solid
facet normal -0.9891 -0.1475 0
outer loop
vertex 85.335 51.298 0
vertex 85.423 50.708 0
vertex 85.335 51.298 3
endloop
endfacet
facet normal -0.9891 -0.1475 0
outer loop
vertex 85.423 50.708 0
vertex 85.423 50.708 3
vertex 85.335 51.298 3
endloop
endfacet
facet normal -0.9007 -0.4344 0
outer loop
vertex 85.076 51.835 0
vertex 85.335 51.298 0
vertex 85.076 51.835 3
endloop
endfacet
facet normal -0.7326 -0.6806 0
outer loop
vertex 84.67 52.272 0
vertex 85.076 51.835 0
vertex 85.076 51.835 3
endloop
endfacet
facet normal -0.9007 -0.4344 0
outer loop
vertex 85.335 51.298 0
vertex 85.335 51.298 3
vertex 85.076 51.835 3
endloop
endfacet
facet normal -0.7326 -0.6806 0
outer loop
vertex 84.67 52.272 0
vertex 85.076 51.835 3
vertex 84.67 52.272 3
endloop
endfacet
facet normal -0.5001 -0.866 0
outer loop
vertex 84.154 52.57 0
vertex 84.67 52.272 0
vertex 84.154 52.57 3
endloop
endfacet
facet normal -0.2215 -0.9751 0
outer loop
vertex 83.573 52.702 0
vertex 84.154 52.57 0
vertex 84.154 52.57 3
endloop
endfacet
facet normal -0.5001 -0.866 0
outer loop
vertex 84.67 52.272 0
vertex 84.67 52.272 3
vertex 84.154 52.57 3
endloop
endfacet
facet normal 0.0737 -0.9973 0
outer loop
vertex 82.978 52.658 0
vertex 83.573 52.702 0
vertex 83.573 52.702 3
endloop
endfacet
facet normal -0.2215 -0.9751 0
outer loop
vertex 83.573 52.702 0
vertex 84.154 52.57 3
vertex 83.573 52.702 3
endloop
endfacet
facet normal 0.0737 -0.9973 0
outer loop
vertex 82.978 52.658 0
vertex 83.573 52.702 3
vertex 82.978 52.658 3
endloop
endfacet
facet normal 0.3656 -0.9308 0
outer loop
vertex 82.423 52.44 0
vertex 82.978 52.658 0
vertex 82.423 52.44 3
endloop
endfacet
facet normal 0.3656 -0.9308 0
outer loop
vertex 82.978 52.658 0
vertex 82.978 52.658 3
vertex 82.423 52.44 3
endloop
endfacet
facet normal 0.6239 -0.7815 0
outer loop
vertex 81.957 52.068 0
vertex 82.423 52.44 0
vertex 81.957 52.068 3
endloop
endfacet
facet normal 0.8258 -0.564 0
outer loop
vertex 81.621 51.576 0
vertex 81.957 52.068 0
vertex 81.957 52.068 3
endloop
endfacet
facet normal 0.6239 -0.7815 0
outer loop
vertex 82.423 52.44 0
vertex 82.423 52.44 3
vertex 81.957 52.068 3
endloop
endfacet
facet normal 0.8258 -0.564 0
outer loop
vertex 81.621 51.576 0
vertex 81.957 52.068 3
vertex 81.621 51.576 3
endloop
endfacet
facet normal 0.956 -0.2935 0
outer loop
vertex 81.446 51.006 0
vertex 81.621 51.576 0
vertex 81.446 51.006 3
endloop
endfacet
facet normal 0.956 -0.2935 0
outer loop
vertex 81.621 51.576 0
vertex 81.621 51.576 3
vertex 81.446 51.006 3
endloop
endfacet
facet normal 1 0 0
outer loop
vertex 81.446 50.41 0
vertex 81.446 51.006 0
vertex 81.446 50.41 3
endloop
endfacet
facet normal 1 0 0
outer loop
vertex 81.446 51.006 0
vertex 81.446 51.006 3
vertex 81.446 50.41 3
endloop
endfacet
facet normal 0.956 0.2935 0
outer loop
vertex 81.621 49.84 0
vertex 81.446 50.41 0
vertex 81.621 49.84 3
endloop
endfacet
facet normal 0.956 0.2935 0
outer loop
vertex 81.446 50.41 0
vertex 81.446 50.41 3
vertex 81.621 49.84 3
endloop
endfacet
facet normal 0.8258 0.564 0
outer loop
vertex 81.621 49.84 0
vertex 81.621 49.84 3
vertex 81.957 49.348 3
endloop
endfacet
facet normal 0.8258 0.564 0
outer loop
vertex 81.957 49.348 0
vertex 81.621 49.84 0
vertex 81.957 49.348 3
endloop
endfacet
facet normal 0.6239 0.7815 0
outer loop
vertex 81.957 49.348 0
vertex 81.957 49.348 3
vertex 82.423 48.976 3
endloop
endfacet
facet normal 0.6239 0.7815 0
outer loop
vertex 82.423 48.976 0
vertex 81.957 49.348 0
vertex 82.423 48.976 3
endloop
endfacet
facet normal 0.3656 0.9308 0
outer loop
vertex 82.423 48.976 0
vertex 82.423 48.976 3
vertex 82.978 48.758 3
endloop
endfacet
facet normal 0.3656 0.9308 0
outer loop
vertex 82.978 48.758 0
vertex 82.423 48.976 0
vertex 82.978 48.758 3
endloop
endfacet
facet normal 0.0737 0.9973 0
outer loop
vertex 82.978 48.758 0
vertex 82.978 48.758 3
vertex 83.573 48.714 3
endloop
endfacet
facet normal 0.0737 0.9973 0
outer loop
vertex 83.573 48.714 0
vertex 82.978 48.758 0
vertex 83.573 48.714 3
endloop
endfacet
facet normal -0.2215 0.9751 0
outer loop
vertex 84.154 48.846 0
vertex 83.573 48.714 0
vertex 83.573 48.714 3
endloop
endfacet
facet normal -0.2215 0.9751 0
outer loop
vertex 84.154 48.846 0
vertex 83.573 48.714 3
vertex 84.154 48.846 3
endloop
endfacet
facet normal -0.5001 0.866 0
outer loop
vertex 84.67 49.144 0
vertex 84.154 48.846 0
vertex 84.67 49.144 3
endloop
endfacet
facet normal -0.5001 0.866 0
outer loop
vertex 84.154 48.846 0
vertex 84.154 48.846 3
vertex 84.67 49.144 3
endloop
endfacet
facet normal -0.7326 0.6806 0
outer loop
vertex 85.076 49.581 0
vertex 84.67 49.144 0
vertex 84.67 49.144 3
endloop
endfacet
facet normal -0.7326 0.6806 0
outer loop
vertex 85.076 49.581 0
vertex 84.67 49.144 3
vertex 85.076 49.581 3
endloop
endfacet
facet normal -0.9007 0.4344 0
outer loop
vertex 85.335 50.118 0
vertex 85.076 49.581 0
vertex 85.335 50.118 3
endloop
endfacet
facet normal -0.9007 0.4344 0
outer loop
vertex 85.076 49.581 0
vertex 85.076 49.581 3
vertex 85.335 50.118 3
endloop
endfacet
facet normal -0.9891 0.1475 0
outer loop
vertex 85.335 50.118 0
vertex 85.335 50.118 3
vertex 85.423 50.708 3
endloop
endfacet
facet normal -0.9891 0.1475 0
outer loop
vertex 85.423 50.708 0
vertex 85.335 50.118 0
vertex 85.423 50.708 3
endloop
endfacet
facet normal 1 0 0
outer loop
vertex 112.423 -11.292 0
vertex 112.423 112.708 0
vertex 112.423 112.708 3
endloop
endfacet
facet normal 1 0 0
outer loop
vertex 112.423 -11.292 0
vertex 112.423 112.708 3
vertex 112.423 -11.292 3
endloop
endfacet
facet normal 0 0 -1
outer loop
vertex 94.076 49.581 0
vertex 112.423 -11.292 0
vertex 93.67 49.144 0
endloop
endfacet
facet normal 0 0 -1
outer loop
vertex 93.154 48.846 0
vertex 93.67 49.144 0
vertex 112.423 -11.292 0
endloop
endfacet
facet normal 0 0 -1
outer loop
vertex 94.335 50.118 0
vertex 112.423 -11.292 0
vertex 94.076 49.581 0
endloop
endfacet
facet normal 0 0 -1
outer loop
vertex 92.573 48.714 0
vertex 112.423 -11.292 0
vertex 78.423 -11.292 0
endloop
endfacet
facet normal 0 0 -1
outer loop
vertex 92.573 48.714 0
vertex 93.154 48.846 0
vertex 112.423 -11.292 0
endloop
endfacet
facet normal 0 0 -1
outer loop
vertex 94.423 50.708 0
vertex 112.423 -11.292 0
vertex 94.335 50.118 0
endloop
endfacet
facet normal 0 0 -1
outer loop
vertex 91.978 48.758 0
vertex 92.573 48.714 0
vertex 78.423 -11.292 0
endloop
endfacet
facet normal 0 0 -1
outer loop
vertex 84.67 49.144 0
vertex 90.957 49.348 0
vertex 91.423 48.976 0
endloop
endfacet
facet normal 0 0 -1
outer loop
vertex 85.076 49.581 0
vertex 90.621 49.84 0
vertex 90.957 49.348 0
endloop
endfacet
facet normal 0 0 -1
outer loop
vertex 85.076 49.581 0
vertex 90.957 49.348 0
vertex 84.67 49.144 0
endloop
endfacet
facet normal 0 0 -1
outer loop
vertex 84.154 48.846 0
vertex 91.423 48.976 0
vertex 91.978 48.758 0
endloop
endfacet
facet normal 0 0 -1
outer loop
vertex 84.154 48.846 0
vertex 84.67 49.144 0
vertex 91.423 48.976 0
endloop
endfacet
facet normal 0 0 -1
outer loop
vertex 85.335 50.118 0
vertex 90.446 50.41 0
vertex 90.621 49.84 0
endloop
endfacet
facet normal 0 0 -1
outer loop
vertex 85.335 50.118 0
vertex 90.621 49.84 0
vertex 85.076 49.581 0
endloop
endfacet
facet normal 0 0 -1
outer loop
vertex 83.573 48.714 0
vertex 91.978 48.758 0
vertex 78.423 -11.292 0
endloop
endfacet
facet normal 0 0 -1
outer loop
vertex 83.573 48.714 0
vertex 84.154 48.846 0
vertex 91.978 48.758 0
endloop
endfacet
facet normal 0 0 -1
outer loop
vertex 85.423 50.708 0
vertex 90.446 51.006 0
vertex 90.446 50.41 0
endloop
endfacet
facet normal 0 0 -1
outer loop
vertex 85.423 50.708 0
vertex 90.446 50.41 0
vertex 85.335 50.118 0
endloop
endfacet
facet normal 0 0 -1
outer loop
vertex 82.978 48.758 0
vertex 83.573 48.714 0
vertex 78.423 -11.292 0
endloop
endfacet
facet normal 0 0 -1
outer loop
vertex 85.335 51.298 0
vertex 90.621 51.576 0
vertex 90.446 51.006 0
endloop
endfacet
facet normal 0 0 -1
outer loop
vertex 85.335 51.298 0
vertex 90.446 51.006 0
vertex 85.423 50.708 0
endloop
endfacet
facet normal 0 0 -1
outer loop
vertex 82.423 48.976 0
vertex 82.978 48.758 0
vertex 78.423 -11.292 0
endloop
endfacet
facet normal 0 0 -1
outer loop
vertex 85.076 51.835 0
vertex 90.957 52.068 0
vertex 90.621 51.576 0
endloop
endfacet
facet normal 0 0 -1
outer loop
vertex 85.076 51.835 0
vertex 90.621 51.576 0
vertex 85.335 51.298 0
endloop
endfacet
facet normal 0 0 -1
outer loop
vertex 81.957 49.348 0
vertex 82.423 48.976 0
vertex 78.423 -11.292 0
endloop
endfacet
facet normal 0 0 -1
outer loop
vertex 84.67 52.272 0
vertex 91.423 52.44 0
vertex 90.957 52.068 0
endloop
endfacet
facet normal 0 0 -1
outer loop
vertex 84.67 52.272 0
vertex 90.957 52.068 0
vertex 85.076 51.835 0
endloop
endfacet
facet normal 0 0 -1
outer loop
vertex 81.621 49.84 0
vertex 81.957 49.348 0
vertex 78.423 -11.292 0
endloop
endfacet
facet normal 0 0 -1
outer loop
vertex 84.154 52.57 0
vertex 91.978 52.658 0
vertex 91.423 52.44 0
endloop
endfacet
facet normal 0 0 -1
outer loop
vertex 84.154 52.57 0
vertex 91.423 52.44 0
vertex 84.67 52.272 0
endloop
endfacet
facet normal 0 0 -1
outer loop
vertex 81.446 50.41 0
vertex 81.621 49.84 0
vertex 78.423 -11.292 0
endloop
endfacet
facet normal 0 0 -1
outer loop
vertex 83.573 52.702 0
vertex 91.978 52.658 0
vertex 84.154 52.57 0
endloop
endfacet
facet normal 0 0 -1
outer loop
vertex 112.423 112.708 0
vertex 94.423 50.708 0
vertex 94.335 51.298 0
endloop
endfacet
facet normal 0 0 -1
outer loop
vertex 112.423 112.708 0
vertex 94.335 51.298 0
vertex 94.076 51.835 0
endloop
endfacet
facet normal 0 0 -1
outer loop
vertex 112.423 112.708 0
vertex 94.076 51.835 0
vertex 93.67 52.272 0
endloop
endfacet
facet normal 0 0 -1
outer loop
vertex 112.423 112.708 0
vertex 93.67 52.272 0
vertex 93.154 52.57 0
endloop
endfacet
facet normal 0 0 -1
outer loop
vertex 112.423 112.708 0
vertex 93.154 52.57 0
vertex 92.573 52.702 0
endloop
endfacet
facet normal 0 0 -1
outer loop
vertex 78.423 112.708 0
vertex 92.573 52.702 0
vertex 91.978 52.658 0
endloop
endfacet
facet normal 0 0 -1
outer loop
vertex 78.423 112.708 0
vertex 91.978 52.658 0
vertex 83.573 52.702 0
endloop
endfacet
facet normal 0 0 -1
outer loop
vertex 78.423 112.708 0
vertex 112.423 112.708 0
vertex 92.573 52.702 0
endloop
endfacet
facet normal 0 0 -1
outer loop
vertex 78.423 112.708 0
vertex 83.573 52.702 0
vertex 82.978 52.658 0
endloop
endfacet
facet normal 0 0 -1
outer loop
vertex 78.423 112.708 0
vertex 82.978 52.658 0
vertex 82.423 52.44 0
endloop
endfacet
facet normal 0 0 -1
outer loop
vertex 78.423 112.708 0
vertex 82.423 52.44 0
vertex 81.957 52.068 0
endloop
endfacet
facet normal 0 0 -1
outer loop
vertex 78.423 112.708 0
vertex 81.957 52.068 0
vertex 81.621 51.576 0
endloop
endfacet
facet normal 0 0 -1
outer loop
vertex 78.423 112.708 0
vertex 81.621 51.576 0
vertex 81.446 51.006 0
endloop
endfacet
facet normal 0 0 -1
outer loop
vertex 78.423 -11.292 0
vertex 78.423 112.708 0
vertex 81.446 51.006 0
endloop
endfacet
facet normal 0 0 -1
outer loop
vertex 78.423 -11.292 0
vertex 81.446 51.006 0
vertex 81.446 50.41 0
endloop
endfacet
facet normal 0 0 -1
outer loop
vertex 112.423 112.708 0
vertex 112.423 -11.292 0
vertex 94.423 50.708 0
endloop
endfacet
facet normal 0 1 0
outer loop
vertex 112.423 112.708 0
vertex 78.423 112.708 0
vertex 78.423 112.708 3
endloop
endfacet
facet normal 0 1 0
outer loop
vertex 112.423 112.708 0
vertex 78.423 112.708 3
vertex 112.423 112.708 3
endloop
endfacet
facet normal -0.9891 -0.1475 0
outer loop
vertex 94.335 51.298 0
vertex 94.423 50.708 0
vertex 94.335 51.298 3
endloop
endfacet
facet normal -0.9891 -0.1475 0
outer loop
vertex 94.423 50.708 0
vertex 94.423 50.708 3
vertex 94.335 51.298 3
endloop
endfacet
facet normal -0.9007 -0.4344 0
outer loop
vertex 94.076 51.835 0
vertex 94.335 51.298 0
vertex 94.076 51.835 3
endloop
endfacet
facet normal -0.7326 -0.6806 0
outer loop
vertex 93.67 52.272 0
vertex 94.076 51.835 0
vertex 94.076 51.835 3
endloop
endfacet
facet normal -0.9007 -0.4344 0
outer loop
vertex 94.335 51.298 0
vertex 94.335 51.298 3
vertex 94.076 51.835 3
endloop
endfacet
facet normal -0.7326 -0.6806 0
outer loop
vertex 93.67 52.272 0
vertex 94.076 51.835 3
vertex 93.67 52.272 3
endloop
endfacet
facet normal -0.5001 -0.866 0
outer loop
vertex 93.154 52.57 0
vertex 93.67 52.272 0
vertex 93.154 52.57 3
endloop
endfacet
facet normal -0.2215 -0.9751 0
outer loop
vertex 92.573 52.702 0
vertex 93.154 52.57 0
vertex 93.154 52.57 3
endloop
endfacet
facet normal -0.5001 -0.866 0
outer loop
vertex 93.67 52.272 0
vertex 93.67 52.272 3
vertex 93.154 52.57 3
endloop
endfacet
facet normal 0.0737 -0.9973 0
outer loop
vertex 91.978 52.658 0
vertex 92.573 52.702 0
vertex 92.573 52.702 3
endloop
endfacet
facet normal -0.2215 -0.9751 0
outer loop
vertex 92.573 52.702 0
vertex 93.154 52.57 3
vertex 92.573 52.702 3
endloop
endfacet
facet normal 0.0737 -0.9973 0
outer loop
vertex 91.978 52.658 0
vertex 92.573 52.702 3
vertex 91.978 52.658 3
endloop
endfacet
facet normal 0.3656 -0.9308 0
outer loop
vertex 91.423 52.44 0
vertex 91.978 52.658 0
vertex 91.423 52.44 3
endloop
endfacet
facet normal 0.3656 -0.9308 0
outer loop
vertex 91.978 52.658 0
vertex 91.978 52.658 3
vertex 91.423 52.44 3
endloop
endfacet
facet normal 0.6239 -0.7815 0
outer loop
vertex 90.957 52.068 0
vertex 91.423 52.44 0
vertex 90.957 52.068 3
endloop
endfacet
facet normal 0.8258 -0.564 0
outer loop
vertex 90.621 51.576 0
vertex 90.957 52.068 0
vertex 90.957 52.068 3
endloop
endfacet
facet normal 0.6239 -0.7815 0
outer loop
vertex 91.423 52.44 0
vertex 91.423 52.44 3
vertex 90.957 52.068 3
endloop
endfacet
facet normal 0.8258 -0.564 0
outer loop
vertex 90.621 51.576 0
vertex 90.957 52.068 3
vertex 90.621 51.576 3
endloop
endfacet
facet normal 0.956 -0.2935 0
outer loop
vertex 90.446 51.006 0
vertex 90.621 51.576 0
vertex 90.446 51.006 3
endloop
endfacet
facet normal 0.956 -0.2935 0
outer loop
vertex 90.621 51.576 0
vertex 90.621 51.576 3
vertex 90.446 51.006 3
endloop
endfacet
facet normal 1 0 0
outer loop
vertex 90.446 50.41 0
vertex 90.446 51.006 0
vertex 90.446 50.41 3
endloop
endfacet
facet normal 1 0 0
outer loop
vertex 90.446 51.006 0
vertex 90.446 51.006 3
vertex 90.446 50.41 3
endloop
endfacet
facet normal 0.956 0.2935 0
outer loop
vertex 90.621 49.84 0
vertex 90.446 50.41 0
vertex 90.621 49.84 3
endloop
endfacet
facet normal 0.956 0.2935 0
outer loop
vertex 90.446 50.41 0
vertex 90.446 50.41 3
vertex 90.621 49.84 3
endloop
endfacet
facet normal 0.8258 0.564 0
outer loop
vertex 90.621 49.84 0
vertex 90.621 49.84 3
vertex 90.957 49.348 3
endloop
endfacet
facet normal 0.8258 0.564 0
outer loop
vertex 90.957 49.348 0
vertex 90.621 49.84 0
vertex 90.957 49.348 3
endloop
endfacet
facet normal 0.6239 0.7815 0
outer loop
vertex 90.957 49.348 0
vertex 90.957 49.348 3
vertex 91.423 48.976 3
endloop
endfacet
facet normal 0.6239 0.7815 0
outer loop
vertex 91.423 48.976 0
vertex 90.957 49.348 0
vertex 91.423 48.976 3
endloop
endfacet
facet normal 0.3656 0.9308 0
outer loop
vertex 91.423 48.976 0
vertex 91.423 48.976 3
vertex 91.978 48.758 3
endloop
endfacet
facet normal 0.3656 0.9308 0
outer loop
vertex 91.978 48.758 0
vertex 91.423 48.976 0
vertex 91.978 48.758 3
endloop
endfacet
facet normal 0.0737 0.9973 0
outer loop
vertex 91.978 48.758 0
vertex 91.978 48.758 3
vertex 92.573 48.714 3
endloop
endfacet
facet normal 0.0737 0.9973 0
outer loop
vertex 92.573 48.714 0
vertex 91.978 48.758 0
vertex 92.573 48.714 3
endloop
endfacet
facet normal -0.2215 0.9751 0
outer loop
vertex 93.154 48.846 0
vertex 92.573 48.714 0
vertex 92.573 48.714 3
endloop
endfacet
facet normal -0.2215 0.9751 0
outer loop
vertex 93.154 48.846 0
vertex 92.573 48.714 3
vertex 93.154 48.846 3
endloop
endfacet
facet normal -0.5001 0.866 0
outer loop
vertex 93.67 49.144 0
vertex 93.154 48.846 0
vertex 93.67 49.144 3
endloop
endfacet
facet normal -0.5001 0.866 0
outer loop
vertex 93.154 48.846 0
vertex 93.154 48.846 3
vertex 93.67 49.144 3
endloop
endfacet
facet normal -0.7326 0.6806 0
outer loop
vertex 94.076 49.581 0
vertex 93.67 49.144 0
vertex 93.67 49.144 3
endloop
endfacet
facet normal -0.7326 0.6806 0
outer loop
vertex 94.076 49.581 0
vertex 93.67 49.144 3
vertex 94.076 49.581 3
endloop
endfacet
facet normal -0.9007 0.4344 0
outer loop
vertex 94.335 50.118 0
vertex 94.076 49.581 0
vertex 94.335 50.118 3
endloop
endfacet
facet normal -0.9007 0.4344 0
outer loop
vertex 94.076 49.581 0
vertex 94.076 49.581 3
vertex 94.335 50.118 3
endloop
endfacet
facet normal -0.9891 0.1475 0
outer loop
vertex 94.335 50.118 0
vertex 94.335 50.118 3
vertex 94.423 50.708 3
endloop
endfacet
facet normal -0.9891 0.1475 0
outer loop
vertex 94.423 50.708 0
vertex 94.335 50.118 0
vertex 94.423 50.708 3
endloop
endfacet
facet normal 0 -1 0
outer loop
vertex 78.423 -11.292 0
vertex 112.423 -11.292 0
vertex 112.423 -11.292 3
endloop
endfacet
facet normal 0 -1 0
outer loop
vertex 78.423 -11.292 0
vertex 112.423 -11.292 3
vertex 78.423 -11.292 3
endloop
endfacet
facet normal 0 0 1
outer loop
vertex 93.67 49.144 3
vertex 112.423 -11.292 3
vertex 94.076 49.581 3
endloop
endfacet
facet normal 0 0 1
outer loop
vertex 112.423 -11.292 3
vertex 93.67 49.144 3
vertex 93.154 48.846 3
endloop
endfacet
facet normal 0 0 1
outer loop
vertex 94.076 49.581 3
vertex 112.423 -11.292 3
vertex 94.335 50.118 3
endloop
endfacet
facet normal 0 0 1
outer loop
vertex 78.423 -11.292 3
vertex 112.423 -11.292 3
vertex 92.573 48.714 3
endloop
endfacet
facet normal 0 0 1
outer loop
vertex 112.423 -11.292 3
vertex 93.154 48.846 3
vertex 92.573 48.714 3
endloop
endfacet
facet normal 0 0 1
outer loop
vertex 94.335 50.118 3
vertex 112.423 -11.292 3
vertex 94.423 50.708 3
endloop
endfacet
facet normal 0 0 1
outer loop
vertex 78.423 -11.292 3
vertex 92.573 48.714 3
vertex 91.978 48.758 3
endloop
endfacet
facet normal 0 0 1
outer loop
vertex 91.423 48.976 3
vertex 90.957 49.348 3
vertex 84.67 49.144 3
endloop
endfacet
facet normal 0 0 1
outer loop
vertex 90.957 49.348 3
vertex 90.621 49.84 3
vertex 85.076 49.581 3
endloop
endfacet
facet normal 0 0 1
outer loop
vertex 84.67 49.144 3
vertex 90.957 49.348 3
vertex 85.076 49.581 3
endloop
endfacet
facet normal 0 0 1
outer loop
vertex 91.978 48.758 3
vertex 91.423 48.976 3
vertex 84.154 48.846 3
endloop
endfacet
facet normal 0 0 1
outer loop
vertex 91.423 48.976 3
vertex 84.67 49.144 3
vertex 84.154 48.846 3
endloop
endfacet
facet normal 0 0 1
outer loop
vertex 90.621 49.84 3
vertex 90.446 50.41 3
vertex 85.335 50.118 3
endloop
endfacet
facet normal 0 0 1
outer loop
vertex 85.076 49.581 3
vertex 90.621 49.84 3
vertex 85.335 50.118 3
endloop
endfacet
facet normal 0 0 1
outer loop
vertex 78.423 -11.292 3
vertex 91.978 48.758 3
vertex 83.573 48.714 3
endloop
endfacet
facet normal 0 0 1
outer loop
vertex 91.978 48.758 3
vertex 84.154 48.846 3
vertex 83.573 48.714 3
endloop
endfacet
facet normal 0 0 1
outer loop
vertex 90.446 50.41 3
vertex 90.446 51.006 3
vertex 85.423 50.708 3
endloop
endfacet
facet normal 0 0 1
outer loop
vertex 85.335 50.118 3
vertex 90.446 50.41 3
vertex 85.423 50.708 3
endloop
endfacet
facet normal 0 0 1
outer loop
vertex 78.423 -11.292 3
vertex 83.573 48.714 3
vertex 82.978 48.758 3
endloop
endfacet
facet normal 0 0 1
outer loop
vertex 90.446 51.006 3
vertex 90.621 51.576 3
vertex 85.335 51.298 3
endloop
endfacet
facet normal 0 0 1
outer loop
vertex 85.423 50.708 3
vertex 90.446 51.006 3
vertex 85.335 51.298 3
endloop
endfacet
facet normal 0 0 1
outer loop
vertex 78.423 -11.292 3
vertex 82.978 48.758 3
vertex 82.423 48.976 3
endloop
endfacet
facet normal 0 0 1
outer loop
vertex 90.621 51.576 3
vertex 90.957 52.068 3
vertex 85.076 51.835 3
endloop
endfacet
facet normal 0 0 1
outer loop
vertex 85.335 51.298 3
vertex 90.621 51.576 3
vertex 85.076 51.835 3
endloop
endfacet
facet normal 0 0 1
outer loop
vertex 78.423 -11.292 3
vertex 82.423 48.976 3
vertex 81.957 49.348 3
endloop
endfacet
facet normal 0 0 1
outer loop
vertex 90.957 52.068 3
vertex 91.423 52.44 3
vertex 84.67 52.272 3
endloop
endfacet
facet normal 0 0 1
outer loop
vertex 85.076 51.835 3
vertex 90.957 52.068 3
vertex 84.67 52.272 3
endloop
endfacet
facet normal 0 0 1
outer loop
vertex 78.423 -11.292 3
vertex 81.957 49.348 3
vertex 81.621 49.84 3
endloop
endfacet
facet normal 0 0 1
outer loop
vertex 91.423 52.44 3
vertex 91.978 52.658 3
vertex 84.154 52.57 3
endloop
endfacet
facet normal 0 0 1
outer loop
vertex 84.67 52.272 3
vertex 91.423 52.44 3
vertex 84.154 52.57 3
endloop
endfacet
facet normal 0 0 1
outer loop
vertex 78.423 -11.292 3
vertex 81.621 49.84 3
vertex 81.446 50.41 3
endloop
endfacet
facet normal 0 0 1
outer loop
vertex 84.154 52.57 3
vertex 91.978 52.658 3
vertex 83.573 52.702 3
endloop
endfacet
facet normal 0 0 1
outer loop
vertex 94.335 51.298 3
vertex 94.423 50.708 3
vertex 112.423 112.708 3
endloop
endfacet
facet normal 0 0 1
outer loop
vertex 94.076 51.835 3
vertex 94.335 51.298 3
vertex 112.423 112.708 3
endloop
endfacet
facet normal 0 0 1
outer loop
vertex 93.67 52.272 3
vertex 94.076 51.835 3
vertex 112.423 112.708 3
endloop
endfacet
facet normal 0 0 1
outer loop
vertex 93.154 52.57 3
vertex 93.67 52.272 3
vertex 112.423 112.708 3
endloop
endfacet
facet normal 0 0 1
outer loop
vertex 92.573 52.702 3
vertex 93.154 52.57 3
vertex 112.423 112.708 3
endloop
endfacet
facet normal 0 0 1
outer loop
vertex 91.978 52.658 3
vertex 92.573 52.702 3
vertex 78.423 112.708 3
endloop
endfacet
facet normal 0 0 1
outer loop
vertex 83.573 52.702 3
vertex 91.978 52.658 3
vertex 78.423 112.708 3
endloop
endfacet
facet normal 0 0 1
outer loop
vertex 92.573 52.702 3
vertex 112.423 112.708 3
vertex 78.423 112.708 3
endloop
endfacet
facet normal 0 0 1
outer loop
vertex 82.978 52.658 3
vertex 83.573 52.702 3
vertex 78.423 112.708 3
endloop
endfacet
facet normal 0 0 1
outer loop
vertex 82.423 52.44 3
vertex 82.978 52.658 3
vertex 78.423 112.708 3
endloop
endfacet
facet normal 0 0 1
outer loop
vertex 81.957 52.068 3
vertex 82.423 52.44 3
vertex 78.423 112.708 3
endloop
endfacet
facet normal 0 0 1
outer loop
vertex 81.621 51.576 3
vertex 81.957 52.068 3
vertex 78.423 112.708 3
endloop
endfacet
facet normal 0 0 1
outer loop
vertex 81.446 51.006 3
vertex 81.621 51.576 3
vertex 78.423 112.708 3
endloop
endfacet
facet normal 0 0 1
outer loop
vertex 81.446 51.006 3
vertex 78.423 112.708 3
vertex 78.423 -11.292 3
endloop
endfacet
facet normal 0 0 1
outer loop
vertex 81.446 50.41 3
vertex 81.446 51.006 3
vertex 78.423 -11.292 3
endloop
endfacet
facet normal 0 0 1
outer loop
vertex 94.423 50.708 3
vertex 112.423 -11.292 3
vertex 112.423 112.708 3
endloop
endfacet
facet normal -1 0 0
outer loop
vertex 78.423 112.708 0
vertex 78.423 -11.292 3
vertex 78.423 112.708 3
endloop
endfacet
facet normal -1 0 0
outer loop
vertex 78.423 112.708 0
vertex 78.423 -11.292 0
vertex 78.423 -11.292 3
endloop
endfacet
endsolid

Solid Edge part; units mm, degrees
sketch "Sketch1" plane through (0, 0, 0) normal (0, 0, 1) x (1, 0, 0)
  line L0 (78.4234, 112.708) -> (112.4234, 112.708)
  line L1 (112.4234, 112.708) -> (112.4234, -11.292)
  line L2 (112.4234, -11.292) -> (78.4234, -11.292)
  line L3 (78.4234, -11.292) -> (78.4234, 112.708)
  dimension "D1" = 34
  dimension "D2" = 124
extrude "Protrusion1" add sketch "Sketch1" along normal blind 3
sketch "Sketch2" plane through (95.4234, 50.708, 3) normal (0, 0, 1) x (1, 0, 0)
  circle A0 centre (-12, 0) radius 2
  circle A1 centre (-3, 0) radius 2
  dimension "D1" = 4
  dimension "D2" = 4
  dimension "D3" = 5
  dimension "D4" = 9
extrude "Cutout1" cut sketch "Sketch2" against normal through all
